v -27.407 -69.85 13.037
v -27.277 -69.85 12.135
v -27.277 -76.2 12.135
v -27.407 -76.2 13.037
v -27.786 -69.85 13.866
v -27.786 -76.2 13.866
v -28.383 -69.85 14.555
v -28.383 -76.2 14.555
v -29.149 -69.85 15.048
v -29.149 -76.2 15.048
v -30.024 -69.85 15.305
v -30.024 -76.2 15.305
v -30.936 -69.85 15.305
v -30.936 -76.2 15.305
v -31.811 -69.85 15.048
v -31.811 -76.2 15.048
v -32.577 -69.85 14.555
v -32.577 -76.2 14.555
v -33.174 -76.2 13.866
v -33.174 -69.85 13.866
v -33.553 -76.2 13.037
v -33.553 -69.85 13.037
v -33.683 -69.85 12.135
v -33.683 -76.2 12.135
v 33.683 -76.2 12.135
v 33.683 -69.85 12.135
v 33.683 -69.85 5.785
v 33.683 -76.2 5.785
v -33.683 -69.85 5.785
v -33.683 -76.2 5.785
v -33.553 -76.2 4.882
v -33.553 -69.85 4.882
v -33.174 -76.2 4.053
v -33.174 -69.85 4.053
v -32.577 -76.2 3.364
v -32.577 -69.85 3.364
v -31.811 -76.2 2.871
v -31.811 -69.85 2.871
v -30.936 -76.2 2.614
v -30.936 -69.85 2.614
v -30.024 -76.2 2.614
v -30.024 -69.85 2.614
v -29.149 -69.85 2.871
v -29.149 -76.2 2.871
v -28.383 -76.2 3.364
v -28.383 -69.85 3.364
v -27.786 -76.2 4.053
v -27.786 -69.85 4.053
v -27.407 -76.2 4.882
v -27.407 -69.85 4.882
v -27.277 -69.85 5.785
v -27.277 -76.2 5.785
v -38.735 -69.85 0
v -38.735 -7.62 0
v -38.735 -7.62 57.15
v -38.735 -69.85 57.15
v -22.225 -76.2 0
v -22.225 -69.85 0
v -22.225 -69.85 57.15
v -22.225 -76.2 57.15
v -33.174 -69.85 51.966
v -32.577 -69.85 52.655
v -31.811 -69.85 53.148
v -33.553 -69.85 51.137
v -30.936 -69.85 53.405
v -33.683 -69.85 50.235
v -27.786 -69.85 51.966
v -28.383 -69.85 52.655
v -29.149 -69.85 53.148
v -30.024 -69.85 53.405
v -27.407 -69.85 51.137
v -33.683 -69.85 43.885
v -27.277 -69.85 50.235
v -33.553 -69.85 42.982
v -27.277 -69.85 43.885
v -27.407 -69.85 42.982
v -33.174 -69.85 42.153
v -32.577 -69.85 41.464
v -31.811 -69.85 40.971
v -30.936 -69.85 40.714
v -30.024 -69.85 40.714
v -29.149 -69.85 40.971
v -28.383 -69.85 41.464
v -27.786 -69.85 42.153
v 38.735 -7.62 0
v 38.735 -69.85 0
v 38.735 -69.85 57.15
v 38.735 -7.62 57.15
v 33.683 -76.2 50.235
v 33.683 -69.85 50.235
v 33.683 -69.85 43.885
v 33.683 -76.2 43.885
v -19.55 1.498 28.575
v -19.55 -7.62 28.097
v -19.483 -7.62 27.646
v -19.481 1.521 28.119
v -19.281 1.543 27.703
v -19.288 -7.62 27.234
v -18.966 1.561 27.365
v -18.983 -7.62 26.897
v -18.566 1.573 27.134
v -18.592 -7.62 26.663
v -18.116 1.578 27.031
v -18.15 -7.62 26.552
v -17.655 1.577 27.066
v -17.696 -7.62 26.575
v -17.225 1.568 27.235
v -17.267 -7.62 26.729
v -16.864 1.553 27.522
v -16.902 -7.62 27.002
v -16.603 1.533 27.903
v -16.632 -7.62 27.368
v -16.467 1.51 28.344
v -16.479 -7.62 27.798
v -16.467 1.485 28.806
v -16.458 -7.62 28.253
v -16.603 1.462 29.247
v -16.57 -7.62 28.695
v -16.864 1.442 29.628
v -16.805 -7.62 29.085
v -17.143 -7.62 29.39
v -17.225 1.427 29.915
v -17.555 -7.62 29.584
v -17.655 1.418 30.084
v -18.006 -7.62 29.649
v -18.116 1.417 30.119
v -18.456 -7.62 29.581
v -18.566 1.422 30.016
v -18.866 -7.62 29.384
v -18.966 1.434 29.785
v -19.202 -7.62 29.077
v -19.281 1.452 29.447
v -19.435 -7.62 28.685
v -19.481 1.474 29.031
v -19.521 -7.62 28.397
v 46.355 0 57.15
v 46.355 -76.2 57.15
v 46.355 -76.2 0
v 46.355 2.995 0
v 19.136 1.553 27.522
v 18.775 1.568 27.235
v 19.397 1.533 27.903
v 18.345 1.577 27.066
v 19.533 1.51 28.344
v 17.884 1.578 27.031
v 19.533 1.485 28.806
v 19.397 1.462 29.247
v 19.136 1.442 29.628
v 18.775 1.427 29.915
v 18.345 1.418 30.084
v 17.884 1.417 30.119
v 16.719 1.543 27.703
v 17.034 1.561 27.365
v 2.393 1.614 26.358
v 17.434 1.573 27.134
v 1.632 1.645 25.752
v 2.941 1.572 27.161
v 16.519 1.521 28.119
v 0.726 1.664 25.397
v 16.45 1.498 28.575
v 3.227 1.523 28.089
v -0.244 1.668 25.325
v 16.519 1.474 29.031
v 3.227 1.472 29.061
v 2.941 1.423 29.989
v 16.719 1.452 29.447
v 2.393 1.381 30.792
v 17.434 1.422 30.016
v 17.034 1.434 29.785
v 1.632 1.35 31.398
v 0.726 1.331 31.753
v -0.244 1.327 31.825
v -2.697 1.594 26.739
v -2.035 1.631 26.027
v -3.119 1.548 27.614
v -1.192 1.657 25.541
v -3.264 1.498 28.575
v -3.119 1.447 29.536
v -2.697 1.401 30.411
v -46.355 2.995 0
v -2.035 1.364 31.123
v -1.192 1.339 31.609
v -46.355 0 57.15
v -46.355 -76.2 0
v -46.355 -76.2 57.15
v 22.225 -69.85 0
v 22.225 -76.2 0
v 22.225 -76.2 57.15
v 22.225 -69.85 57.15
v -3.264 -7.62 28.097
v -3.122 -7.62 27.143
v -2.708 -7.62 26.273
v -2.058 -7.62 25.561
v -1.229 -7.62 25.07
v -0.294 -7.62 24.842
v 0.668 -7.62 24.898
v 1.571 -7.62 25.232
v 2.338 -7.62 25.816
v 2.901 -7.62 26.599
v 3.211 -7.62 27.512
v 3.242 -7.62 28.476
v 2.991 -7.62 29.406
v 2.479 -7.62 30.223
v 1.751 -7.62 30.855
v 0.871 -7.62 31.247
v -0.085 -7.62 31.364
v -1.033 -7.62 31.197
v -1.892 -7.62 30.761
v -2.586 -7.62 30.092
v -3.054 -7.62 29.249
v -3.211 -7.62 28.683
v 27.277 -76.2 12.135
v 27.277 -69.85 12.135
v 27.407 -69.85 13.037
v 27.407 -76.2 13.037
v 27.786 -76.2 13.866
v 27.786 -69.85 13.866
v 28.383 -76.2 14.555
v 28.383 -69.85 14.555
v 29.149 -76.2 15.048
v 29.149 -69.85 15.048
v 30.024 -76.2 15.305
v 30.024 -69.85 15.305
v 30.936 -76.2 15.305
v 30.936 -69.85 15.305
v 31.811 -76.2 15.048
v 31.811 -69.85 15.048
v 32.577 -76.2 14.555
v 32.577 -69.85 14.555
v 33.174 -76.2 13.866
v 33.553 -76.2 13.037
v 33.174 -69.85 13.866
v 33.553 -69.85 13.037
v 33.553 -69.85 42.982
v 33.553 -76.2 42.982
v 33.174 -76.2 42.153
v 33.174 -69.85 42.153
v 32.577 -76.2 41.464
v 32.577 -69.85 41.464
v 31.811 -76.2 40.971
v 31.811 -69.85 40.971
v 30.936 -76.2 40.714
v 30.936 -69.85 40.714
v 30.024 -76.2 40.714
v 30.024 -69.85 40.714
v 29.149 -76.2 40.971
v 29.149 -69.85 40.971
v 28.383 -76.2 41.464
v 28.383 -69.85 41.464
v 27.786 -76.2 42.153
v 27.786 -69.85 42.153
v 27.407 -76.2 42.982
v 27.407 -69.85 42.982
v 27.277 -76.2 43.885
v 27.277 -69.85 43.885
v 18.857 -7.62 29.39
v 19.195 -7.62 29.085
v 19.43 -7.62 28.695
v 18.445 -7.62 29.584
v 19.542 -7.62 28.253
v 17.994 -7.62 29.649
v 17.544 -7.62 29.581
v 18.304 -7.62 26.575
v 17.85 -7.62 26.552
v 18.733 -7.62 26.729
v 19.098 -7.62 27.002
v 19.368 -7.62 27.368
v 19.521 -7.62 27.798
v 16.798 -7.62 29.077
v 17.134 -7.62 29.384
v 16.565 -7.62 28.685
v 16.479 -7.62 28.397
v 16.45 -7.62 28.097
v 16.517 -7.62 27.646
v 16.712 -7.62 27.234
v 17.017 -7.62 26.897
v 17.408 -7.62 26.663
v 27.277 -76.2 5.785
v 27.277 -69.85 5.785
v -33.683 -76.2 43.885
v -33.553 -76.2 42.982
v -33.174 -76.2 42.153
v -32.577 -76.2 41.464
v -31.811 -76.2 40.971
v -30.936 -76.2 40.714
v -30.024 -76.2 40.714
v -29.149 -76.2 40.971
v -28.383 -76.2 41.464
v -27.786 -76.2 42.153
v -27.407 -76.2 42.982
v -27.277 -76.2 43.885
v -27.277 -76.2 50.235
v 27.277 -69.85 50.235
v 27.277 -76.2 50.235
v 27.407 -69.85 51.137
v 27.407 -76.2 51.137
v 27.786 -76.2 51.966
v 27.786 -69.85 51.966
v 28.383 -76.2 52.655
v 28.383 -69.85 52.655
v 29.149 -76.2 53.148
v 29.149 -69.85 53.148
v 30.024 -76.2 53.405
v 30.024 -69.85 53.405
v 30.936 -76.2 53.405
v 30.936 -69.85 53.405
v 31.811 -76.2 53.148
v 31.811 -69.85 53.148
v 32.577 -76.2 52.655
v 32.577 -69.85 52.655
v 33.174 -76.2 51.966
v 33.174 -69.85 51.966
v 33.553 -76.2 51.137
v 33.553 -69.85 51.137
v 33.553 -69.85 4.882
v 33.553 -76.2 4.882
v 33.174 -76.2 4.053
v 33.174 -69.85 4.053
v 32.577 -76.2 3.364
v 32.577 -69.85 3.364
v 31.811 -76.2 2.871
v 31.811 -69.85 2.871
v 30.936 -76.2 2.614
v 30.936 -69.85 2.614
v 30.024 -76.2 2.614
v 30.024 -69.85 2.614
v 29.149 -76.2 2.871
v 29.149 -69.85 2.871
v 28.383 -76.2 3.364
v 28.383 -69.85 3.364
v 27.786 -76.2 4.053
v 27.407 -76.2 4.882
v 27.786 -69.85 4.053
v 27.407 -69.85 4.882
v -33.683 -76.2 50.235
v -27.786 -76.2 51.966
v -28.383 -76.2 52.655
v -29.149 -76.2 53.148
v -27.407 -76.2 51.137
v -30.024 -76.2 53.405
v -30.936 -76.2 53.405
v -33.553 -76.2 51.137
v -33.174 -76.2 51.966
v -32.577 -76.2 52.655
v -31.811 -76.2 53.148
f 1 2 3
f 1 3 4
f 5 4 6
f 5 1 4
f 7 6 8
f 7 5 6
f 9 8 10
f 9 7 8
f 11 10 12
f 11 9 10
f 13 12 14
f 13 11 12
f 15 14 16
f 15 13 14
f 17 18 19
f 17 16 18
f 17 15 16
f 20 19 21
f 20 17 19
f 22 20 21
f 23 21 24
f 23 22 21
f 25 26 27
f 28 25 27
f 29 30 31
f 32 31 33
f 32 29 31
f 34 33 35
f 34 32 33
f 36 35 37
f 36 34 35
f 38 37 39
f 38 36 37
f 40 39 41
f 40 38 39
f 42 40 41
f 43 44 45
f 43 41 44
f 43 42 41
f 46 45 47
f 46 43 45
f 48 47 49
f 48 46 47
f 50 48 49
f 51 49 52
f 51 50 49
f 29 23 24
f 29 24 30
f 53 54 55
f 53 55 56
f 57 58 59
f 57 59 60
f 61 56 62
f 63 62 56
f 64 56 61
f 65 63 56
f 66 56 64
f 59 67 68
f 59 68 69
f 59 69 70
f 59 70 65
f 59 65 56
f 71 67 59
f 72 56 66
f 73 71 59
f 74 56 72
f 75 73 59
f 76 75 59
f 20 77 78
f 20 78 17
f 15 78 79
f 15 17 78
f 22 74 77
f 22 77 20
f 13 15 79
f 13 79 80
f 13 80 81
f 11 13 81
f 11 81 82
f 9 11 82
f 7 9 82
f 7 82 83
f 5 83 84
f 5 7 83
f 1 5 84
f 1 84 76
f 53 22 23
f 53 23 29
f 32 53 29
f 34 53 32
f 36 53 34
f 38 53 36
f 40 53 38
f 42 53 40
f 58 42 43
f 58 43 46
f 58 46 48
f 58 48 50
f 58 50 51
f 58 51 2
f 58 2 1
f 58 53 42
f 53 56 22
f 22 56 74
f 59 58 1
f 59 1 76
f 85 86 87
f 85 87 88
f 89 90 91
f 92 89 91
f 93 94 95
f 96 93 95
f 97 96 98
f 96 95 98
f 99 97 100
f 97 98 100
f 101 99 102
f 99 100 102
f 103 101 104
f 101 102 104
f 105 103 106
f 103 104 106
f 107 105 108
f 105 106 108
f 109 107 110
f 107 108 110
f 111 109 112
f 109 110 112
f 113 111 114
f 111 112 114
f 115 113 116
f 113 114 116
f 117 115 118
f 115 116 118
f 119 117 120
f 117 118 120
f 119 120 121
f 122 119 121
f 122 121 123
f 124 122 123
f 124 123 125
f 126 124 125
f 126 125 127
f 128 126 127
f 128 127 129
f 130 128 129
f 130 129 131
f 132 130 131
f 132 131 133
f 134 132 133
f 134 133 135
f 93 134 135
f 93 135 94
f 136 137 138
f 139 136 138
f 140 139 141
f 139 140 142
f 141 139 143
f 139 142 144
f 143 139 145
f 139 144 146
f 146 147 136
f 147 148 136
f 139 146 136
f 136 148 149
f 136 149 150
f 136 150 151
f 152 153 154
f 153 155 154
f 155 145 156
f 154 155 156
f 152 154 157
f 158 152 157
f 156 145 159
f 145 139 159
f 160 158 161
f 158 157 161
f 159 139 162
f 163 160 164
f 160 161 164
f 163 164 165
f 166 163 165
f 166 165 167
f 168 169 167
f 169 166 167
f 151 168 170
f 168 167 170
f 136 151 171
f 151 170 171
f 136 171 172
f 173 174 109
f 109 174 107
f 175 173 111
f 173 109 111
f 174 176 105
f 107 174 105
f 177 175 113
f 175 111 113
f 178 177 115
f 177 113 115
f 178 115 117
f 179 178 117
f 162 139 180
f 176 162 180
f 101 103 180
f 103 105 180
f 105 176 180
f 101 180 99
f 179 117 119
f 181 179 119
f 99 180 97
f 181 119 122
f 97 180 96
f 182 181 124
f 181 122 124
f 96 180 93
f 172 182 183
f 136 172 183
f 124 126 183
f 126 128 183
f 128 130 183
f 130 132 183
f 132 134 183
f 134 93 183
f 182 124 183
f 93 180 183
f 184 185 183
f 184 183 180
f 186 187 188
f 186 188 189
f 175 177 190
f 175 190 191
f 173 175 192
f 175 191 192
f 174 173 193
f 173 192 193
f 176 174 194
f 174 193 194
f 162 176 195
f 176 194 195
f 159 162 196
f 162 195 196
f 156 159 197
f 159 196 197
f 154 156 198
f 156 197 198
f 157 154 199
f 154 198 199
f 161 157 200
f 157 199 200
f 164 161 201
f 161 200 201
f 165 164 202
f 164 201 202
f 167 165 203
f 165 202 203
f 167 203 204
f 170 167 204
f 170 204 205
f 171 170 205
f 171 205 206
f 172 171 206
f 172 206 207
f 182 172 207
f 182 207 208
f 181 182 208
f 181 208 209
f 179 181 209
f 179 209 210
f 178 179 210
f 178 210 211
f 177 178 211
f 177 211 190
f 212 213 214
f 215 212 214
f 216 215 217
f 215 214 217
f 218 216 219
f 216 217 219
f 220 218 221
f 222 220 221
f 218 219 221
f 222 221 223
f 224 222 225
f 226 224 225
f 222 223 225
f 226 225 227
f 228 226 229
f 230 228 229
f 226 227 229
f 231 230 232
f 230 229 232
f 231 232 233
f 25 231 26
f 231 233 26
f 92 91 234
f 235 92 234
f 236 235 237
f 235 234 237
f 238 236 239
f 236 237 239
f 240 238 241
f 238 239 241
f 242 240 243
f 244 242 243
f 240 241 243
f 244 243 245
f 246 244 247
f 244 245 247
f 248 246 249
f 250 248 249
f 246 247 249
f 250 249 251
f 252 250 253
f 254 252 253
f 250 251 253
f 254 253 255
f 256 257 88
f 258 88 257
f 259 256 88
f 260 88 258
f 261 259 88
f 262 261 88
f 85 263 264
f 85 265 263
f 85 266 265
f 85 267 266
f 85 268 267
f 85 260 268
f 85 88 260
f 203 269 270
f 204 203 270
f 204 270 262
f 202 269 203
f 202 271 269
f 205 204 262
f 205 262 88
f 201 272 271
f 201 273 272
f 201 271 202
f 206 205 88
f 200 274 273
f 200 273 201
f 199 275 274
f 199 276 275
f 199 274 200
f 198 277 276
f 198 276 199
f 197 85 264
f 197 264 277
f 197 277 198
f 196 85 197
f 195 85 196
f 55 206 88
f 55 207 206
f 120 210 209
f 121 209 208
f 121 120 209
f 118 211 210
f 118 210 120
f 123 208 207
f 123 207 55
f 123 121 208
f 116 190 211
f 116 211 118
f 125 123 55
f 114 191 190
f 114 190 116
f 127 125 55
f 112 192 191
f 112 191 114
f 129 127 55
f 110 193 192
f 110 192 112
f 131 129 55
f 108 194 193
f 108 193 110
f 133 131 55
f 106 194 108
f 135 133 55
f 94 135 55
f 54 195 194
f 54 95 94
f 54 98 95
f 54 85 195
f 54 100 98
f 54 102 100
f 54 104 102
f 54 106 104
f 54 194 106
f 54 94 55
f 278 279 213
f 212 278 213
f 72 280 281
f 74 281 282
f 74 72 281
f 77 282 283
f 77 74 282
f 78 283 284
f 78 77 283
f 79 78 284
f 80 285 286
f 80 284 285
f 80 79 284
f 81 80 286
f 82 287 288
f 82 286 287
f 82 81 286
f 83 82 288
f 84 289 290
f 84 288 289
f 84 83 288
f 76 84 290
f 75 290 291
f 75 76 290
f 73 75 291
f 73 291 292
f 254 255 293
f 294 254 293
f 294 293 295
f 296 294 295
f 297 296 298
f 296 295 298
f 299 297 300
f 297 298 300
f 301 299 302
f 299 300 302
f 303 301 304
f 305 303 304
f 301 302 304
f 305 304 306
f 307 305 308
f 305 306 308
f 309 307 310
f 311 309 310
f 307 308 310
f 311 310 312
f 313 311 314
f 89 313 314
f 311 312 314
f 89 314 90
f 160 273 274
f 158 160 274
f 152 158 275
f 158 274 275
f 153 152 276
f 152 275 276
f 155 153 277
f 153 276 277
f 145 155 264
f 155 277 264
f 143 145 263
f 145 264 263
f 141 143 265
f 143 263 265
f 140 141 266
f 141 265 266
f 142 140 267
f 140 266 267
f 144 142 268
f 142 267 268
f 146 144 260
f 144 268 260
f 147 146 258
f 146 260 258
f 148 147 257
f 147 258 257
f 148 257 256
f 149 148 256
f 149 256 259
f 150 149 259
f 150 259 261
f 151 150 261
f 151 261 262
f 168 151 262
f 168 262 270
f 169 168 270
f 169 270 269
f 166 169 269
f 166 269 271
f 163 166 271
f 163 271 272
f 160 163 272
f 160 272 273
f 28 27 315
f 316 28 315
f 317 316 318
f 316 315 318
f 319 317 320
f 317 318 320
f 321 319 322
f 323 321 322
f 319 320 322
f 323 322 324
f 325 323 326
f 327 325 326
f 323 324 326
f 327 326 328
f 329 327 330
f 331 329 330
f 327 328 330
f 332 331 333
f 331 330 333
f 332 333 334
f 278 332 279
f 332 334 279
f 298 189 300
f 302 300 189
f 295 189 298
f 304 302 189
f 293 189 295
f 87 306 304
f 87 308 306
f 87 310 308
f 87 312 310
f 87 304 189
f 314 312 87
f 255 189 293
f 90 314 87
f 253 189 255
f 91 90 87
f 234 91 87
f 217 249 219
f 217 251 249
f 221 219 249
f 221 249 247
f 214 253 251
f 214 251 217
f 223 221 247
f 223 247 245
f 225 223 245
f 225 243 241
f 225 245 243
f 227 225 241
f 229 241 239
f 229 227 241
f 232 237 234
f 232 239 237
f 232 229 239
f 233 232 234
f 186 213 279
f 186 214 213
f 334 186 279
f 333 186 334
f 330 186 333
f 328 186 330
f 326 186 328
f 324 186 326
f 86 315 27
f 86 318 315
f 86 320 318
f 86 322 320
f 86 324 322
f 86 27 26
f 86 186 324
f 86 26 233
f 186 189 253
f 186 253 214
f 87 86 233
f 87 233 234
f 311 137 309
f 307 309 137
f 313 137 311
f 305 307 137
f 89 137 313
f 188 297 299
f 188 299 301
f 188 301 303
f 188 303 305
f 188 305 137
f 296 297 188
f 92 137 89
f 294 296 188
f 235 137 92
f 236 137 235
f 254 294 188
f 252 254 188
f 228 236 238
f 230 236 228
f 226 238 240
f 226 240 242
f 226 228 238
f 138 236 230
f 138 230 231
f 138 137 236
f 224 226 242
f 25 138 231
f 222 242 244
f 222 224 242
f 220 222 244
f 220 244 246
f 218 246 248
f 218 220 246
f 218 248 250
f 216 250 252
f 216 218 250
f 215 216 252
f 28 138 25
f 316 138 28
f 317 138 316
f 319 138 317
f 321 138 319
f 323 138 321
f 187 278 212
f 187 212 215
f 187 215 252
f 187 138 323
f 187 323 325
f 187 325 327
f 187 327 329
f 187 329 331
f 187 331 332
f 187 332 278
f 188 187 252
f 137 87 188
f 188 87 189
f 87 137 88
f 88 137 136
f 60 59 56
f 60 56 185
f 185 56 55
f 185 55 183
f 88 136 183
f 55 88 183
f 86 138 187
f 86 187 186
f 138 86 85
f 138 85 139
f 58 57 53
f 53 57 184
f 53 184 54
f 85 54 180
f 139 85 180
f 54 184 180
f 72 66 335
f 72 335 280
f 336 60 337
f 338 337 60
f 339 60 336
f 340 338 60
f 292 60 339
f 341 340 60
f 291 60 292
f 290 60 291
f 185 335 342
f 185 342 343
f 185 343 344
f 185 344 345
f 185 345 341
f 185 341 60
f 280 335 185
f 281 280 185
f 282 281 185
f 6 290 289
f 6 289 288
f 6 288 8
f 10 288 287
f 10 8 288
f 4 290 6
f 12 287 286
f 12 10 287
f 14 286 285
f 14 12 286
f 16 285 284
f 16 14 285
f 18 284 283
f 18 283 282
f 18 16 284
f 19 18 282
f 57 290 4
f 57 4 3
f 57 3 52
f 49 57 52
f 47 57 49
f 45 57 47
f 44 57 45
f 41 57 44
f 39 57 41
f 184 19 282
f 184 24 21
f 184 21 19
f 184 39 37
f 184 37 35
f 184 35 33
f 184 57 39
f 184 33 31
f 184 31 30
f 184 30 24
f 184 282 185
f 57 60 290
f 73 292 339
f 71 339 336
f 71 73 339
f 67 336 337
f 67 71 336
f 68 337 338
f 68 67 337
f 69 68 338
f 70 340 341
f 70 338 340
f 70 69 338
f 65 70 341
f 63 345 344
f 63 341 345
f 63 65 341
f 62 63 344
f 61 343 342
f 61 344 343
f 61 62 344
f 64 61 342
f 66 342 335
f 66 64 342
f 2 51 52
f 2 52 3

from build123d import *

# Parameters (mm, degrees)
BOSS_EXTRUDE1_DEPTH      = 57.15
CUT_EXTRUDE1_DEPTH       = 102.459011551
BOSS_EXTRUDE2_DEPTH      = 92.71
F_0_257_DIAMETER_HOLE1_D = 6.5278
F_3_0MM_DOWEL_HOLE1_D    = 3.1


with BuildPart() as part:
    # Sketch2 → Boss-Extrude1 (new body)
    with BuildSketch(Plane.XY):
        Polygon((-46.355, 0), (46.355, 0), (46.355, -76.2), (22.225, -76.2), (22.225, -69.85), (38.735, -69.85), (38.735, -7.62), (-38.735, -7.62), (-38.735, -69.85), (-22.225, -69.85), (-22.225, -76.2), (-46.355, -76.2), align=None)
    extrude(amount=BOSS_EXTRUDE1_DEPTH)

    # Sketch3 → Cut-Extrude1 (cut, through all)
    with BuildSketch(Plane(origin=(0, -69.85, 0), x_dir=(1, 0, 0), z_dir=(0, 1, 0))):
        with BuildLine():
            Line((-27.27706, -5.784822778), (-27.27706, -12.134822778))
            ThreePointArc((-27.27706, -12.134822778), (-30.48, -15.337762778), (-33.68294, -12.134822778))
            Line((-33.68294, -12.134822778), (-33.68294, -5.784822778))
            ThreePointArc((-33.68294, -5.784822778), (-30.48, -2.581882778), (-27.27706, -5.784822778))
        make_face()
        with BuildLine():
            Line((-33.68294, -50.234822778), (-33.68294, -43.884822778))
            ThreePointArc((-33.68294, -43.884822778), (-30.48, -40.681882778), (-27.27706, -43.884822778))
            Line((-27.27706, -43.884822778), (-27.27706, -50.234822778))
            ThreePointArc((-27.27706, -50.234822778), (-30.48, -53.437762778), (-33.68294, -50.234822778))
        make_face()
    cut_extrude1 = extrude(amount=-CUT_EXTRUDE1_DEPTH, mode=Mode.SUBTRACT)

    # Mirror1: Cut-Extrude1 across plane
    add(cut_extrude1.mirror(Plane(origin=(0, 0, 0), x_dir=(0, 0, 1), z_dir=(1, 0, 0))), mode=Mode.SUBTRACT)

    # Sketch4 → Boss-Extrude2 (add)
    with BuildSketch(Plane.ZY.offset(46.355)):
        Polygon((57.15, 0), (0, 0), (0, 2.995104586), align=None)
    extrude(amount=-BOSS_EXTRUDE2_DEPTH)

    # F (0.257) Diameter Hole1 (through all)
    with Locations(Plane(origin=(0, 2.986900838, 0.15653684), x_dir=(1, 0, 0), z_dir=(0, 0.9986295347545744, 0.052335956242936806))):
        with Locations((0, -28.457463124)):
            Hole(F_0_257_DIAMETER_HOLE1_D / 2)

    # Ø3.0mm Dowel Hole1 (through all)
    with Locations(Plane(origin=(0, 2.986900838, 0.15653684), x_dir=(1, 0, 0), z_dir=(0, 0.9986295347545744, 0.052335956242936806))):
        with Locations((-18, -28.457463124), (18, -28.457463124)):
            Hole(F_3_0MM_DOWEL_HOLE1_D / 2)


solid = part.part
